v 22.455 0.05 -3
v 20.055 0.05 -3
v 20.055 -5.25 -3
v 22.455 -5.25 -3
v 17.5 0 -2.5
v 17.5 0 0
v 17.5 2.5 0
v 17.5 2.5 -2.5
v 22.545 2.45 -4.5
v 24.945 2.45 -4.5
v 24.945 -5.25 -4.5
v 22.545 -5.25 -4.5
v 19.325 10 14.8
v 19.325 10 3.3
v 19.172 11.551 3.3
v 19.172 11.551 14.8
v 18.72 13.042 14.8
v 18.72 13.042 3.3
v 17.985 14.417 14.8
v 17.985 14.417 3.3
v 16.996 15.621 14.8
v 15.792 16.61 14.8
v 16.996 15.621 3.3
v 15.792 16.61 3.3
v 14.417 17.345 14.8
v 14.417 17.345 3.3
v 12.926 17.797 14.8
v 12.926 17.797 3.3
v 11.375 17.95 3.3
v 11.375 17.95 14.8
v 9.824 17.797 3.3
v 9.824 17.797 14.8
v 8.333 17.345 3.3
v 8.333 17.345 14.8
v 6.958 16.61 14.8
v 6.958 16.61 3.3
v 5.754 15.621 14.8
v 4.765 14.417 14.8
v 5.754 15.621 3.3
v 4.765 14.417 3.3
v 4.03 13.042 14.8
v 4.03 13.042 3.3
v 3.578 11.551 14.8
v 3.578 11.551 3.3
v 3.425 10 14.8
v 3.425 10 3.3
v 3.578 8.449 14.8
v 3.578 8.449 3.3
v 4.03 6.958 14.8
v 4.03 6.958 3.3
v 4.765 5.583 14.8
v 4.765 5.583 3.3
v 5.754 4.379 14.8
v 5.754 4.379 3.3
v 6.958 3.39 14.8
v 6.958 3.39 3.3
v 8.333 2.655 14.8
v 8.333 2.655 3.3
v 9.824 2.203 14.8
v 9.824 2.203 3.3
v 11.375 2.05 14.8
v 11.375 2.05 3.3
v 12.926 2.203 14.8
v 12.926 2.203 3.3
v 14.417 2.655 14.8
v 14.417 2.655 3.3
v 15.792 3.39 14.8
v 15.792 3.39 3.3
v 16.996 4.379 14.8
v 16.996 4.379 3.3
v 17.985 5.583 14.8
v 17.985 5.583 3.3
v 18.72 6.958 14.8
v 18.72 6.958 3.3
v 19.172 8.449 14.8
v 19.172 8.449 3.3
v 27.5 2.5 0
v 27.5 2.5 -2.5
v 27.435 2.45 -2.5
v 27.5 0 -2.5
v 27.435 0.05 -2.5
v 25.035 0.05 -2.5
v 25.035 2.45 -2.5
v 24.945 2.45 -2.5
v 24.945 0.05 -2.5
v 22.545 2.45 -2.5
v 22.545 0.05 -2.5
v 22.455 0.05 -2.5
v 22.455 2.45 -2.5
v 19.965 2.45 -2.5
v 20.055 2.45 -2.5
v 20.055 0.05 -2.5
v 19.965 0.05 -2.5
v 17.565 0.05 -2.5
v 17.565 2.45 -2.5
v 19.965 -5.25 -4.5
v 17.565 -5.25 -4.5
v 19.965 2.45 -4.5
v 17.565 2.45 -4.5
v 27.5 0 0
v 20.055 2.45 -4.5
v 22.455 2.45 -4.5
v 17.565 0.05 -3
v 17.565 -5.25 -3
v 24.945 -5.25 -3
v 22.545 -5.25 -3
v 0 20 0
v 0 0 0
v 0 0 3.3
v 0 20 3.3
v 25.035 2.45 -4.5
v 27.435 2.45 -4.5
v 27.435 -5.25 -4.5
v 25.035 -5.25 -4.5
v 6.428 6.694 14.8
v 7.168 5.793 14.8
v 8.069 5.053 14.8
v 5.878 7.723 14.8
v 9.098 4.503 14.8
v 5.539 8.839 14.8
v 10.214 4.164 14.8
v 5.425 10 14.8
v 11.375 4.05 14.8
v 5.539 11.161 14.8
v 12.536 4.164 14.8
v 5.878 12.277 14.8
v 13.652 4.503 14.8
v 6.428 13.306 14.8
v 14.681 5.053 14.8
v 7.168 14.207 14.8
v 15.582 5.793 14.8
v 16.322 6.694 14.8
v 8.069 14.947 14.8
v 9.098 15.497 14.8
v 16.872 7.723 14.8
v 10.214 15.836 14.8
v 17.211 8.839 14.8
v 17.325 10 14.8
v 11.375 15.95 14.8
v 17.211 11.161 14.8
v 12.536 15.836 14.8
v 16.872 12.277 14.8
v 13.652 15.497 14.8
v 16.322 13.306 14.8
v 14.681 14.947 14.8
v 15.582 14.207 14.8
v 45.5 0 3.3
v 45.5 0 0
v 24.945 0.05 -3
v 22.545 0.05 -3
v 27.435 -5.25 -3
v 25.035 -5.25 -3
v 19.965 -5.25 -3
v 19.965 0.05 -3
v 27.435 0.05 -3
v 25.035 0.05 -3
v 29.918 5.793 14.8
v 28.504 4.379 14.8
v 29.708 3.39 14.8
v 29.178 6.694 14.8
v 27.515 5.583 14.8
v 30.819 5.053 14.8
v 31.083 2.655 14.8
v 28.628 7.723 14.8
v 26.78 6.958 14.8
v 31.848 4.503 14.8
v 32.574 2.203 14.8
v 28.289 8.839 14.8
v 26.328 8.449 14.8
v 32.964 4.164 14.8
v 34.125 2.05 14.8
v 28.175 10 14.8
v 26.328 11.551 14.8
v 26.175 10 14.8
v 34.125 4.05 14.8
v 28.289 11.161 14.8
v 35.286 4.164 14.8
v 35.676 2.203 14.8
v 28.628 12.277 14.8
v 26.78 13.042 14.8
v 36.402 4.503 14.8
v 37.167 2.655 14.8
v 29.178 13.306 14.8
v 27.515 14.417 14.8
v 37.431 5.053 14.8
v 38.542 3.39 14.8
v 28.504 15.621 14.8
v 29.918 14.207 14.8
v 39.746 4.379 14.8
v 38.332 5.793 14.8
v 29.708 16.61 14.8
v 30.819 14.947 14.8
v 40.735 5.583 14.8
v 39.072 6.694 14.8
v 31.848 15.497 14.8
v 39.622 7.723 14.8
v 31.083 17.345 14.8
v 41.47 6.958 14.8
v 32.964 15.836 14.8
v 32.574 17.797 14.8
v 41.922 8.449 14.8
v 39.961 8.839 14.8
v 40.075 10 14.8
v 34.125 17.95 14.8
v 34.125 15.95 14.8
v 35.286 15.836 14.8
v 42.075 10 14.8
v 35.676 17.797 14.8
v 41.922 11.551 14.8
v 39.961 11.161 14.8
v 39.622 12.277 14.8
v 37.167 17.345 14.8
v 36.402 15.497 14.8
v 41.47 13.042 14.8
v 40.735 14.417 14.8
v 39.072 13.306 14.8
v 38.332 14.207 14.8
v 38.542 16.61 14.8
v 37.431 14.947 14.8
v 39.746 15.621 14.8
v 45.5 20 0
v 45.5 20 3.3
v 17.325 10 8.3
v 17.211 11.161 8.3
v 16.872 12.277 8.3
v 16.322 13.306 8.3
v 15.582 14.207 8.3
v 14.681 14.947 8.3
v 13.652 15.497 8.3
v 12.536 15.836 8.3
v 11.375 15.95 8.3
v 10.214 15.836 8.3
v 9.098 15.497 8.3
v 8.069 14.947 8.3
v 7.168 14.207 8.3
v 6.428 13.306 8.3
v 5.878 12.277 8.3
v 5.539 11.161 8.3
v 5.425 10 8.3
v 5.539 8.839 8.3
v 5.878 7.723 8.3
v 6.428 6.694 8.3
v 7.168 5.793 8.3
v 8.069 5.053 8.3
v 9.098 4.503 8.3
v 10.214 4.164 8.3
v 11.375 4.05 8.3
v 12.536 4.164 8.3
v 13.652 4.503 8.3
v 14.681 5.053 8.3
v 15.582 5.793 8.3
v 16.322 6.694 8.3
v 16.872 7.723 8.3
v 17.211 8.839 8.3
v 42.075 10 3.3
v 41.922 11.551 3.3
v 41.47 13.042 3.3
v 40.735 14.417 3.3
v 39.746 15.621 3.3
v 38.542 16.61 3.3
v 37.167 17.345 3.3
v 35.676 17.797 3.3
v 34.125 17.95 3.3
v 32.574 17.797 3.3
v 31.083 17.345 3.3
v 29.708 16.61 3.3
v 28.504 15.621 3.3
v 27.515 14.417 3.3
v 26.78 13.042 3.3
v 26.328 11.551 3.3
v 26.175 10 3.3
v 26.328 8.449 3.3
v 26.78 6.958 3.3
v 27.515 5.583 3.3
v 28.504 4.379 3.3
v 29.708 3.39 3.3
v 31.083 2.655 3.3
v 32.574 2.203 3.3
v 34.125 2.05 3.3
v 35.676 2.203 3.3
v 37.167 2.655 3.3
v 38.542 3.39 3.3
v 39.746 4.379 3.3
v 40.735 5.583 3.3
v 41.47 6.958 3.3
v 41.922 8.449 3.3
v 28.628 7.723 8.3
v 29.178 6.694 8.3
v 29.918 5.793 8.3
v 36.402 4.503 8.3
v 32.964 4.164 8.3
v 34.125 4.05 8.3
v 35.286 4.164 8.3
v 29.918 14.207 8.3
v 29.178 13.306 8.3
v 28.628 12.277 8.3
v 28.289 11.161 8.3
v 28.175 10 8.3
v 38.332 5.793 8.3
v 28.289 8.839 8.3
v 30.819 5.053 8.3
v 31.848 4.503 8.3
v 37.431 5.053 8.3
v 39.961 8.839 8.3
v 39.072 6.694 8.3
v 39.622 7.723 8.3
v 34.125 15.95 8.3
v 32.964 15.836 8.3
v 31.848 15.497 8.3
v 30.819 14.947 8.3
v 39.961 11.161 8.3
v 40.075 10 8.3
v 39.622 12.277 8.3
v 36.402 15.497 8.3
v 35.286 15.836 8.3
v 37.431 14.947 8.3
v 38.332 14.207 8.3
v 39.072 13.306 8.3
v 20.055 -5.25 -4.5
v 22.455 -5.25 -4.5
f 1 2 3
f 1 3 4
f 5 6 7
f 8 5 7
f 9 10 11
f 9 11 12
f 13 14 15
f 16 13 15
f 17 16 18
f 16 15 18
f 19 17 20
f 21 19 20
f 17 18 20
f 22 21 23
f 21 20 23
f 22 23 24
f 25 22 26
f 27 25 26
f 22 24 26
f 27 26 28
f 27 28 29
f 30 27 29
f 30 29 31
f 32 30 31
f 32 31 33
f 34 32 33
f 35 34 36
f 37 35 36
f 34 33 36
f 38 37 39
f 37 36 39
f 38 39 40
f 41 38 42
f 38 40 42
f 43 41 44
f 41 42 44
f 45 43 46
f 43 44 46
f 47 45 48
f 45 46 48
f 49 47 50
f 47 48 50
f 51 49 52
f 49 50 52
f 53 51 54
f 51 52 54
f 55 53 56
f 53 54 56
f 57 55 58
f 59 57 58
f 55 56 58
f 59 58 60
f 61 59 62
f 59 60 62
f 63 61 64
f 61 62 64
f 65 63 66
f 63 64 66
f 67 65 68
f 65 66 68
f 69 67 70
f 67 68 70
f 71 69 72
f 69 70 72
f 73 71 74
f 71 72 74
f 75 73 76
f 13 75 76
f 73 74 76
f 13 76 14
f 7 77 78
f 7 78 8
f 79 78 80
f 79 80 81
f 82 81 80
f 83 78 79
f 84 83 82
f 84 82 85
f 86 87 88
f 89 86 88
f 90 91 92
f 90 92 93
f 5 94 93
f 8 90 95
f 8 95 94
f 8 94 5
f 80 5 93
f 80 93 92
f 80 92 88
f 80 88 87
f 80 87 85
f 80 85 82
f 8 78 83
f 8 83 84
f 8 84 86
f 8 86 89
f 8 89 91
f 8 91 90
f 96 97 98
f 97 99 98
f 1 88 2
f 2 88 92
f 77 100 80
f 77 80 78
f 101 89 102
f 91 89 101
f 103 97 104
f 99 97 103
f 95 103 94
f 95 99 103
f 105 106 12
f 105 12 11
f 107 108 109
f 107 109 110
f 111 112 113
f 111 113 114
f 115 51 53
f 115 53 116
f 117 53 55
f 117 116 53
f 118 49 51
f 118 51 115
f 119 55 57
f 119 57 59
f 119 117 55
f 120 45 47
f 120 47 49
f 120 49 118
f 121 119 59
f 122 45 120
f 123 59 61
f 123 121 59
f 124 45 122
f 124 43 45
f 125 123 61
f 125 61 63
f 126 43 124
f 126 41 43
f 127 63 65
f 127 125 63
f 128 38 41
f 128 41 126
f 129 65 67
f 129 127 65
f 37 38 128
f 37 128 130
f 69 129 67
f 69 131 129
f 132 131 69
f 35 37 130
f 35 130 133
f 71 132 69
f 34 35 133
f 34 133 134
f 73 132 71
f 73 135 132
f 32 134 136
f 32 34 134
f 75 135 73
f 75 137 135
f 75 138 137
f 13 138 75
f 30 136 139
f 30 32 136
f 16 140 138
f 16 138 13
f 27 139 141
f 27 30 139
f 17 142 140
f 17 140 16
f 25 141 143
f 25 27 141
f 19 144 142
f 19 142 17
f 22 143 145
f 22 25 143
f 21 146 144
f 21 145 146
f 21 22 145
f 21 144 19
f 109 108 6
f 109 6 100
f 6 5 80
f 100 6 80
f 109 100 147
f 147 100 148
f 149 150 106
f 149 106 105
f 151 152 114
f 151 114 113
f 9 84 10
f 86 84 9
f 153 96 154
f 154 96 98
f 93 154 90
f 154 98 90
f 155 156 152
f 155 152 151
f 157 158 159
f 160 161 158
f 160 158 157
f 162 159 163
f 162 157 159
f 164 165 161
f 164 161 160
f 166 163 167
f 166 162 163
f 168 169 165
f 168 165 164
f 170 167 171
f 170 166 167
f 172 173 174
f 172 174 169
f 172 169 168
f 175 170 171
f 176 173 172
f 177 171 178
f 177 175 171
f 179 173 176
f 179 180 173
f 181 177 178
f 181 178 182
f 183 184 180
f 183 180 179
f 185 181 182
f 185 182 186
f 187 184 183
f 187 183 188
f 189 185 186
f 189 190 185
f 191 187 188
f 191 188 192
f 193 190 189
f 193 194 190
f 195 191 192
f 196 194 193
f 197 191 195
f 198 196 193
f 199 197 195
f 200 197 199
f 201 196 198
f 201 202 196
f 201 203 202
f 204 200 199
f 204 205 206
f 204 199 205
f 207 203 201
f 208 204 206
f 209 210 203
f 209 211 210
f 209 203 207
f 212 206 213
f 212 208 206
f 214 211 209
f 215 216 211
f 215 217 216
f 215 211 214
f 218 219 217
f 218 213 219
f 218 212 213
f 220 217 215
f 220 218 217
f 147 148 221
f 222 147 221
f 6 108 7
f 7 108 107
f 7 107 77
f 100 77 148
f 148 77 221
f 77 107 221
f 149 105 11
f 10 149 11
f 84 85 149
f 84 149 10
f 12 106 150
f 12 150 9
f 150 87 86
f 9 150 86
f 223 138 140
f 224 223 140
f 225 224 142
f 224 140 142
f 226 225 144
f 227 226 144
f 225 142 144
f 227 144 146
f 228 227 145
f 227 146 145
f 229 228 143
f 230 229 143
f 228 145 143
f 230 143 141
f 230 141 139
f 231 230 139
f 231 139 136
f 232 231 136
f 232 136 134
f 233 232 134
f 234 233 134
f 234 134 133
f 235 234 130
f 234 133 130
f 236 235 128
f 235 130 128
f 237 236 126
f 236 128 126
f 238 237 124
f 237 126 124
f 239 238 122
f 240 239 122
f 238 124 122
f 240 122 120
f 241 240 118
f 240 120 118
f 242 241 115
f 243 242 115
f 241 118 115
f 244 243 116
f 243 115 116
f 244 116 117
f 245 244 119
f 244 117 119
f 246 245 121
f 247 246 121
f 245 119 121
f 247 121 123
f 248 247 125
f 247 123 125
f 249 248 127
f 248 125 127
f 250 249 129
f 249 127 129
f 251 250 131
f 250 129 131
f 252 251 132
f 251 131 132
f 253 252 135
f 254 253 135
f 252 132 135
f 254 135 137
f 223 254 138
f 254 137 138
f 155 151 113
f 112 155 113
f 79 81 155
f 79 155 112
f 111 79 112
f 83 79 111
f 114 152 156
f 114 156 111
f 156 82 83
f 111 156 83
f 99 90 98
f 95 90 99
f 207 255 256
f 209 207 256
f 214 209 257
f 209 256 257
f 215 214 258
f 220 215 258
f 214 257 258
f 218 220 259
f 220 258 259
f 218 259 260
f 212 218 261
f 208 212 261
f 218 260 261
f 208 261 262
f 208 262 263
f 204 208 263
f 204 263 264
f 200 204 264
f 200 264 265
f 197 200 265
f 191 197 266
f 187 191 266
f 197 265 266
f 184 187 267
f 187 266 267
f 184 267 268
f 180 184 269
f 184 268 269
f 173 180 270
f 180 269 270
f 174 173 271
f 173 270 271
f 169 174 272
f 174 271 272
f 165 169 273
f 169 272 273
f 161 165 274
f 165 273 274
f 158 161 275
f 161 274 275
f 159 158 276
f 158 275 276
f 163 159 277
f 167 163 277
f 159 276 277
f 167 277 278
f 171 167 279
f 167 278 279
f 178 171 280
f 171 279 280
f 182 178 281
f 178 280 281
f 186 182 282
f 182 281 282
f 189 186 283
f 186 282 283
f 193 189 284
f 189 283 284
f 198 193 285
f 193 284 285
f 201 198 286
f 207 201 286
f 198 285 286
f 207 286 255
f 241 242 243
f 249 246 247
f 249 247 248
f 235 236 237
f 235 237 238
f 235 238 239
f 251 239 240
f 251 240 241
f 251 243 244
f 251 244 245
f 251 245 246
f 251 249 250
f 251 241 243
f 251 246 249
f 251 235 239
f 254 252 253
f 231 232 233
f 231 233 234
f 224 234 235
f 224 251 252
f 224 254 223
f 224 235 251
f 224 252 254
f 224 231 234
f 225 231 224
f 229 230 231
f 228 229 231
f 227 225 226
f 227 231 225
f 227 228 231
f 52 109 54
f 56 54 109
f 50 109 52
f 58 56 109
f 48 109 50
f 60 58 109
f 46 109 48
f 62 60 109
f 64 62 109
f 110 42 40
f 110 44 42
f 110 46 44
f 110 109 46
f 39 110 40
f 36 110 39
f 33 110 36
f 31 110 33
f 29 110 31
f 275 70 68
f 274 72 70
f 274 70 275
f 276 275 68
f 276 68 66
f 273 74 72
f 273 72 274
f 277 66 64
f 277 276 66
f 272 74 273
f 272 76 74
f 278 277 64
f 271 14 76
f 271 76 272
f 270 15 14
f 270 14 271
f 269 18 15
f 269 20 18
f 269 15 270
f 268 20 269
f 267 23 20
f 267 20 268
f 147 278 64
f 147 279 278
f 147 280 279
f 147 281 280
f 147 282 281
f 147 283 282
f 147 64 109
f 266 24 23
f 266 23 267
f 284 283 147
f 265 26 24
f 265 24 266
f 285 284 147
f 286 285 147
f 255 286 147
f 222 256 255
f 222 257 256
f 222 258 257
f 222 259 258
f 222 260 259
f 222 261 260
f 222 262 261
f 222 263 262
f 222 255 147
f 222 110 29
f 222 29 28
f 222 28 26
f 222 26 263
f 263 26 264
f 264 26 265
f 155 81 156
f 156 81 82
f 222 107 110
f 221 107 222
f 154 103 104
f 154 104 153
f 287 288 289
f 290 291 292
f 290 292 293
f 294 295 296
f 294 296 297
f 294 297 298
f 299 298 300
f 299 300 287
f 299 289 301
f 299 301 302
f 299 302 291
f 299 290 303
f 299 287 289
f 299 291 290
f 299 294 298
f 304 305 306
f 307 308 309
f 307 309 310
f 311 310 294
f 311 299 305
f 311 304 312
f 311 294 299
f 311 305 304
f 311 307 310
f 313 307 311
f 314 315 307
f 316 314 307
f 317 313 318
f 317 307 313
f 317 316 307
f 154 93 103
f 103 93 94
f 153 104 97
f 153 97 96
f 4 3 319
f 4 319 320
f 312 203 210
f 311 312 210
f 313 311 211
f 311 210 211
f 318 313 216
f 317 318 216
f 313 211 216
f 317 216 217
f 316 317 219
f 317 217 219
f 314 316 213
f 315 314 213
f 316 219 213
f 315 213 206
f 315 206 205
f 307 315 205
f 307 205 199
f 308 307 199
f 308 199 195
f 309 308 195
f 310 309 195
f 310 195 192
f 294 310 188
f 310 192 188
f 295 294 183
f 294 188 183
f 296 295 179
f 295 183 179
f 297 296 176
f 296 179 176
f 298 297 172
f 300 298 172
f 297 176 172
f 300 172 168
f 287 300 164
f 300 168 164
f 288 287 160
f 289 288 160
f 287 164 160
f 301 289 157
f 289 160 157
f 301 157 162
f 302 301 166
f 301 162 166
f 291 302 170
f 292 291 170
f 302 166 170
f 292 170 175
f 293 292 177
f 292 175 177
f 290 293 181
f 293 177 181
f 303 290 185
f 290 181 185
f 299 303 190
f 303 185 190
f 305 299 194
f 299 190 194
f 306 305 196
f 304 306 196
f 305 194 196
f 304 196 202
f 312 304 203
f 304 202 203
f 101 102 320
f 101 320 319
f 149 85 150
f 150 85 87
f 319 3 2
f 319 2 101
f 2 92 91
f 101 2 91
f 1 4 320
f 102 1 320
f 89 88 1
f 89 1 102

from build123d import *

# Parameters (mm, degrees)
CROQUIS1_W              = 45.5
CROQUIS1_H              = 20
SALIENTE_EXTRUIR1_DEPTH = 3.3
CROQUIS2_R              = 7.95
SALIENTE_EXTRUIR2_DEPTH = 11.5
CROQUIS3_R              = 5.95
CORTAR_EXTRUIR1_DEPTH   = 6.5
CROQUIS4_W              = 10
CROQUIS4_H              = 2.5
SALIENTE_EXTRUIR3_DEPTH = 2.5
CROQUIS5_W              = 2.4
CROQUIS5_H              = 2.4
SALIENTE_EXTRUIR4_DEPTH = 2
CROQUIS6_W              = 2.4
CROQUIS6_H              = 1.5
SALIENTE_EXTRUIR5_DEPTH = 5.3


with BuildPart() as part:
    # Croquis1 → Saliente-Extruir1 (new body)
    with BuildSketch(Plane.XY):
        with Locations((22.75, 10)):
            Rectangle(CROQUIS1_W, CROQUIS1_H)
    extrude(amount=SALIENTE_EXTRUIR1_DEPTH)

    # Croquis2 → Saliente-Extruir2 (add)
    with BuildSketch(Plane.XY.offset(3.3)):
        with Locations((34.125, 10)):
            Circle(CROQUIS2_R)
        with Locations((11.375, 10)):
            Circle(CROQUIS2_R)
    extrude(amount=SALIENTE_EXTRUIR2_DEPTH)

    # Croquis3 → Cortar-Extruir1 (cut)
    with BuildSketch(Plane.XY.offset(14.8)):
        with Locations((34.125, 10)):
            Circle(CROQUIS3_R)
        with Locations((11.375, 10)):
            Circle(CROQUIS3_R)
    extrude(amount=-CORTAR_EXTRUIR1_DEPTH, mode=Mode.SUBTRACT)

    # Croquis4 → Saliente-Extruir3 (add)
    with BuildSketch(Plane(origin=(0, 0, 0), x_dir=(-1, 0, 0), z_dir=(0, 0, -1))):
        with Locations((-22.5, 1.25)):
            Rectangle(CROQUIS4_W, CROQUIS4_H)
    extrude(amount=SALIENTE_EXTRUIR3_DEPTH)

    # Croquis5 → Saliente-Extruir4 (add)
    with BuildSketch(Plane(origin=(0, 0, -2.5), x_dir=(-1, 0, 0), z_dir=(0, 0, -1))):
        with Locations((-26.235, 1.25)):
            Rectangle(CROQUIS5_W, CROQUIS5_H)
        with Locations((-23.745, 1.25)):
            Rectangle(CROQUIS5_W, CROQUIS5_H)
        with Locations((-21.255, 1.25)):
            Rectangle(CROQUIS5_W, CROQUIS5_H)
        with Locations((-18.765, 1.25)):
            Rectangle(CROQUIS5_W, CROQUIS5_H)
    extrude(amount=SALIENTE_EXTRUIR4_DEPTH)

    # Croquis6 → Saliente-Extruir5 (add)
    with BuildSketch(Plane.XZ.offset(-0.05)):
        with Locations((18.765, -3.75)):
            Rectangle(CROQUIS6_W, CROQUIS6_H)
        with Locations((21.255, -3.75)):
            Rectangle(CROQUIS6_W, CROQUIS6_H)
        with Locations((23.745, -3.75)):
            Rectangle(CROQUIS6_W, CROQUIS6_H)
        with Locations((26.235, -3.75)):
            Rectangle(CROQUIS6_W, CROQUIS6_H)
    extrude(amount=SALIENTE_EXTRUIR5_DEPTH)


solid = part.part
